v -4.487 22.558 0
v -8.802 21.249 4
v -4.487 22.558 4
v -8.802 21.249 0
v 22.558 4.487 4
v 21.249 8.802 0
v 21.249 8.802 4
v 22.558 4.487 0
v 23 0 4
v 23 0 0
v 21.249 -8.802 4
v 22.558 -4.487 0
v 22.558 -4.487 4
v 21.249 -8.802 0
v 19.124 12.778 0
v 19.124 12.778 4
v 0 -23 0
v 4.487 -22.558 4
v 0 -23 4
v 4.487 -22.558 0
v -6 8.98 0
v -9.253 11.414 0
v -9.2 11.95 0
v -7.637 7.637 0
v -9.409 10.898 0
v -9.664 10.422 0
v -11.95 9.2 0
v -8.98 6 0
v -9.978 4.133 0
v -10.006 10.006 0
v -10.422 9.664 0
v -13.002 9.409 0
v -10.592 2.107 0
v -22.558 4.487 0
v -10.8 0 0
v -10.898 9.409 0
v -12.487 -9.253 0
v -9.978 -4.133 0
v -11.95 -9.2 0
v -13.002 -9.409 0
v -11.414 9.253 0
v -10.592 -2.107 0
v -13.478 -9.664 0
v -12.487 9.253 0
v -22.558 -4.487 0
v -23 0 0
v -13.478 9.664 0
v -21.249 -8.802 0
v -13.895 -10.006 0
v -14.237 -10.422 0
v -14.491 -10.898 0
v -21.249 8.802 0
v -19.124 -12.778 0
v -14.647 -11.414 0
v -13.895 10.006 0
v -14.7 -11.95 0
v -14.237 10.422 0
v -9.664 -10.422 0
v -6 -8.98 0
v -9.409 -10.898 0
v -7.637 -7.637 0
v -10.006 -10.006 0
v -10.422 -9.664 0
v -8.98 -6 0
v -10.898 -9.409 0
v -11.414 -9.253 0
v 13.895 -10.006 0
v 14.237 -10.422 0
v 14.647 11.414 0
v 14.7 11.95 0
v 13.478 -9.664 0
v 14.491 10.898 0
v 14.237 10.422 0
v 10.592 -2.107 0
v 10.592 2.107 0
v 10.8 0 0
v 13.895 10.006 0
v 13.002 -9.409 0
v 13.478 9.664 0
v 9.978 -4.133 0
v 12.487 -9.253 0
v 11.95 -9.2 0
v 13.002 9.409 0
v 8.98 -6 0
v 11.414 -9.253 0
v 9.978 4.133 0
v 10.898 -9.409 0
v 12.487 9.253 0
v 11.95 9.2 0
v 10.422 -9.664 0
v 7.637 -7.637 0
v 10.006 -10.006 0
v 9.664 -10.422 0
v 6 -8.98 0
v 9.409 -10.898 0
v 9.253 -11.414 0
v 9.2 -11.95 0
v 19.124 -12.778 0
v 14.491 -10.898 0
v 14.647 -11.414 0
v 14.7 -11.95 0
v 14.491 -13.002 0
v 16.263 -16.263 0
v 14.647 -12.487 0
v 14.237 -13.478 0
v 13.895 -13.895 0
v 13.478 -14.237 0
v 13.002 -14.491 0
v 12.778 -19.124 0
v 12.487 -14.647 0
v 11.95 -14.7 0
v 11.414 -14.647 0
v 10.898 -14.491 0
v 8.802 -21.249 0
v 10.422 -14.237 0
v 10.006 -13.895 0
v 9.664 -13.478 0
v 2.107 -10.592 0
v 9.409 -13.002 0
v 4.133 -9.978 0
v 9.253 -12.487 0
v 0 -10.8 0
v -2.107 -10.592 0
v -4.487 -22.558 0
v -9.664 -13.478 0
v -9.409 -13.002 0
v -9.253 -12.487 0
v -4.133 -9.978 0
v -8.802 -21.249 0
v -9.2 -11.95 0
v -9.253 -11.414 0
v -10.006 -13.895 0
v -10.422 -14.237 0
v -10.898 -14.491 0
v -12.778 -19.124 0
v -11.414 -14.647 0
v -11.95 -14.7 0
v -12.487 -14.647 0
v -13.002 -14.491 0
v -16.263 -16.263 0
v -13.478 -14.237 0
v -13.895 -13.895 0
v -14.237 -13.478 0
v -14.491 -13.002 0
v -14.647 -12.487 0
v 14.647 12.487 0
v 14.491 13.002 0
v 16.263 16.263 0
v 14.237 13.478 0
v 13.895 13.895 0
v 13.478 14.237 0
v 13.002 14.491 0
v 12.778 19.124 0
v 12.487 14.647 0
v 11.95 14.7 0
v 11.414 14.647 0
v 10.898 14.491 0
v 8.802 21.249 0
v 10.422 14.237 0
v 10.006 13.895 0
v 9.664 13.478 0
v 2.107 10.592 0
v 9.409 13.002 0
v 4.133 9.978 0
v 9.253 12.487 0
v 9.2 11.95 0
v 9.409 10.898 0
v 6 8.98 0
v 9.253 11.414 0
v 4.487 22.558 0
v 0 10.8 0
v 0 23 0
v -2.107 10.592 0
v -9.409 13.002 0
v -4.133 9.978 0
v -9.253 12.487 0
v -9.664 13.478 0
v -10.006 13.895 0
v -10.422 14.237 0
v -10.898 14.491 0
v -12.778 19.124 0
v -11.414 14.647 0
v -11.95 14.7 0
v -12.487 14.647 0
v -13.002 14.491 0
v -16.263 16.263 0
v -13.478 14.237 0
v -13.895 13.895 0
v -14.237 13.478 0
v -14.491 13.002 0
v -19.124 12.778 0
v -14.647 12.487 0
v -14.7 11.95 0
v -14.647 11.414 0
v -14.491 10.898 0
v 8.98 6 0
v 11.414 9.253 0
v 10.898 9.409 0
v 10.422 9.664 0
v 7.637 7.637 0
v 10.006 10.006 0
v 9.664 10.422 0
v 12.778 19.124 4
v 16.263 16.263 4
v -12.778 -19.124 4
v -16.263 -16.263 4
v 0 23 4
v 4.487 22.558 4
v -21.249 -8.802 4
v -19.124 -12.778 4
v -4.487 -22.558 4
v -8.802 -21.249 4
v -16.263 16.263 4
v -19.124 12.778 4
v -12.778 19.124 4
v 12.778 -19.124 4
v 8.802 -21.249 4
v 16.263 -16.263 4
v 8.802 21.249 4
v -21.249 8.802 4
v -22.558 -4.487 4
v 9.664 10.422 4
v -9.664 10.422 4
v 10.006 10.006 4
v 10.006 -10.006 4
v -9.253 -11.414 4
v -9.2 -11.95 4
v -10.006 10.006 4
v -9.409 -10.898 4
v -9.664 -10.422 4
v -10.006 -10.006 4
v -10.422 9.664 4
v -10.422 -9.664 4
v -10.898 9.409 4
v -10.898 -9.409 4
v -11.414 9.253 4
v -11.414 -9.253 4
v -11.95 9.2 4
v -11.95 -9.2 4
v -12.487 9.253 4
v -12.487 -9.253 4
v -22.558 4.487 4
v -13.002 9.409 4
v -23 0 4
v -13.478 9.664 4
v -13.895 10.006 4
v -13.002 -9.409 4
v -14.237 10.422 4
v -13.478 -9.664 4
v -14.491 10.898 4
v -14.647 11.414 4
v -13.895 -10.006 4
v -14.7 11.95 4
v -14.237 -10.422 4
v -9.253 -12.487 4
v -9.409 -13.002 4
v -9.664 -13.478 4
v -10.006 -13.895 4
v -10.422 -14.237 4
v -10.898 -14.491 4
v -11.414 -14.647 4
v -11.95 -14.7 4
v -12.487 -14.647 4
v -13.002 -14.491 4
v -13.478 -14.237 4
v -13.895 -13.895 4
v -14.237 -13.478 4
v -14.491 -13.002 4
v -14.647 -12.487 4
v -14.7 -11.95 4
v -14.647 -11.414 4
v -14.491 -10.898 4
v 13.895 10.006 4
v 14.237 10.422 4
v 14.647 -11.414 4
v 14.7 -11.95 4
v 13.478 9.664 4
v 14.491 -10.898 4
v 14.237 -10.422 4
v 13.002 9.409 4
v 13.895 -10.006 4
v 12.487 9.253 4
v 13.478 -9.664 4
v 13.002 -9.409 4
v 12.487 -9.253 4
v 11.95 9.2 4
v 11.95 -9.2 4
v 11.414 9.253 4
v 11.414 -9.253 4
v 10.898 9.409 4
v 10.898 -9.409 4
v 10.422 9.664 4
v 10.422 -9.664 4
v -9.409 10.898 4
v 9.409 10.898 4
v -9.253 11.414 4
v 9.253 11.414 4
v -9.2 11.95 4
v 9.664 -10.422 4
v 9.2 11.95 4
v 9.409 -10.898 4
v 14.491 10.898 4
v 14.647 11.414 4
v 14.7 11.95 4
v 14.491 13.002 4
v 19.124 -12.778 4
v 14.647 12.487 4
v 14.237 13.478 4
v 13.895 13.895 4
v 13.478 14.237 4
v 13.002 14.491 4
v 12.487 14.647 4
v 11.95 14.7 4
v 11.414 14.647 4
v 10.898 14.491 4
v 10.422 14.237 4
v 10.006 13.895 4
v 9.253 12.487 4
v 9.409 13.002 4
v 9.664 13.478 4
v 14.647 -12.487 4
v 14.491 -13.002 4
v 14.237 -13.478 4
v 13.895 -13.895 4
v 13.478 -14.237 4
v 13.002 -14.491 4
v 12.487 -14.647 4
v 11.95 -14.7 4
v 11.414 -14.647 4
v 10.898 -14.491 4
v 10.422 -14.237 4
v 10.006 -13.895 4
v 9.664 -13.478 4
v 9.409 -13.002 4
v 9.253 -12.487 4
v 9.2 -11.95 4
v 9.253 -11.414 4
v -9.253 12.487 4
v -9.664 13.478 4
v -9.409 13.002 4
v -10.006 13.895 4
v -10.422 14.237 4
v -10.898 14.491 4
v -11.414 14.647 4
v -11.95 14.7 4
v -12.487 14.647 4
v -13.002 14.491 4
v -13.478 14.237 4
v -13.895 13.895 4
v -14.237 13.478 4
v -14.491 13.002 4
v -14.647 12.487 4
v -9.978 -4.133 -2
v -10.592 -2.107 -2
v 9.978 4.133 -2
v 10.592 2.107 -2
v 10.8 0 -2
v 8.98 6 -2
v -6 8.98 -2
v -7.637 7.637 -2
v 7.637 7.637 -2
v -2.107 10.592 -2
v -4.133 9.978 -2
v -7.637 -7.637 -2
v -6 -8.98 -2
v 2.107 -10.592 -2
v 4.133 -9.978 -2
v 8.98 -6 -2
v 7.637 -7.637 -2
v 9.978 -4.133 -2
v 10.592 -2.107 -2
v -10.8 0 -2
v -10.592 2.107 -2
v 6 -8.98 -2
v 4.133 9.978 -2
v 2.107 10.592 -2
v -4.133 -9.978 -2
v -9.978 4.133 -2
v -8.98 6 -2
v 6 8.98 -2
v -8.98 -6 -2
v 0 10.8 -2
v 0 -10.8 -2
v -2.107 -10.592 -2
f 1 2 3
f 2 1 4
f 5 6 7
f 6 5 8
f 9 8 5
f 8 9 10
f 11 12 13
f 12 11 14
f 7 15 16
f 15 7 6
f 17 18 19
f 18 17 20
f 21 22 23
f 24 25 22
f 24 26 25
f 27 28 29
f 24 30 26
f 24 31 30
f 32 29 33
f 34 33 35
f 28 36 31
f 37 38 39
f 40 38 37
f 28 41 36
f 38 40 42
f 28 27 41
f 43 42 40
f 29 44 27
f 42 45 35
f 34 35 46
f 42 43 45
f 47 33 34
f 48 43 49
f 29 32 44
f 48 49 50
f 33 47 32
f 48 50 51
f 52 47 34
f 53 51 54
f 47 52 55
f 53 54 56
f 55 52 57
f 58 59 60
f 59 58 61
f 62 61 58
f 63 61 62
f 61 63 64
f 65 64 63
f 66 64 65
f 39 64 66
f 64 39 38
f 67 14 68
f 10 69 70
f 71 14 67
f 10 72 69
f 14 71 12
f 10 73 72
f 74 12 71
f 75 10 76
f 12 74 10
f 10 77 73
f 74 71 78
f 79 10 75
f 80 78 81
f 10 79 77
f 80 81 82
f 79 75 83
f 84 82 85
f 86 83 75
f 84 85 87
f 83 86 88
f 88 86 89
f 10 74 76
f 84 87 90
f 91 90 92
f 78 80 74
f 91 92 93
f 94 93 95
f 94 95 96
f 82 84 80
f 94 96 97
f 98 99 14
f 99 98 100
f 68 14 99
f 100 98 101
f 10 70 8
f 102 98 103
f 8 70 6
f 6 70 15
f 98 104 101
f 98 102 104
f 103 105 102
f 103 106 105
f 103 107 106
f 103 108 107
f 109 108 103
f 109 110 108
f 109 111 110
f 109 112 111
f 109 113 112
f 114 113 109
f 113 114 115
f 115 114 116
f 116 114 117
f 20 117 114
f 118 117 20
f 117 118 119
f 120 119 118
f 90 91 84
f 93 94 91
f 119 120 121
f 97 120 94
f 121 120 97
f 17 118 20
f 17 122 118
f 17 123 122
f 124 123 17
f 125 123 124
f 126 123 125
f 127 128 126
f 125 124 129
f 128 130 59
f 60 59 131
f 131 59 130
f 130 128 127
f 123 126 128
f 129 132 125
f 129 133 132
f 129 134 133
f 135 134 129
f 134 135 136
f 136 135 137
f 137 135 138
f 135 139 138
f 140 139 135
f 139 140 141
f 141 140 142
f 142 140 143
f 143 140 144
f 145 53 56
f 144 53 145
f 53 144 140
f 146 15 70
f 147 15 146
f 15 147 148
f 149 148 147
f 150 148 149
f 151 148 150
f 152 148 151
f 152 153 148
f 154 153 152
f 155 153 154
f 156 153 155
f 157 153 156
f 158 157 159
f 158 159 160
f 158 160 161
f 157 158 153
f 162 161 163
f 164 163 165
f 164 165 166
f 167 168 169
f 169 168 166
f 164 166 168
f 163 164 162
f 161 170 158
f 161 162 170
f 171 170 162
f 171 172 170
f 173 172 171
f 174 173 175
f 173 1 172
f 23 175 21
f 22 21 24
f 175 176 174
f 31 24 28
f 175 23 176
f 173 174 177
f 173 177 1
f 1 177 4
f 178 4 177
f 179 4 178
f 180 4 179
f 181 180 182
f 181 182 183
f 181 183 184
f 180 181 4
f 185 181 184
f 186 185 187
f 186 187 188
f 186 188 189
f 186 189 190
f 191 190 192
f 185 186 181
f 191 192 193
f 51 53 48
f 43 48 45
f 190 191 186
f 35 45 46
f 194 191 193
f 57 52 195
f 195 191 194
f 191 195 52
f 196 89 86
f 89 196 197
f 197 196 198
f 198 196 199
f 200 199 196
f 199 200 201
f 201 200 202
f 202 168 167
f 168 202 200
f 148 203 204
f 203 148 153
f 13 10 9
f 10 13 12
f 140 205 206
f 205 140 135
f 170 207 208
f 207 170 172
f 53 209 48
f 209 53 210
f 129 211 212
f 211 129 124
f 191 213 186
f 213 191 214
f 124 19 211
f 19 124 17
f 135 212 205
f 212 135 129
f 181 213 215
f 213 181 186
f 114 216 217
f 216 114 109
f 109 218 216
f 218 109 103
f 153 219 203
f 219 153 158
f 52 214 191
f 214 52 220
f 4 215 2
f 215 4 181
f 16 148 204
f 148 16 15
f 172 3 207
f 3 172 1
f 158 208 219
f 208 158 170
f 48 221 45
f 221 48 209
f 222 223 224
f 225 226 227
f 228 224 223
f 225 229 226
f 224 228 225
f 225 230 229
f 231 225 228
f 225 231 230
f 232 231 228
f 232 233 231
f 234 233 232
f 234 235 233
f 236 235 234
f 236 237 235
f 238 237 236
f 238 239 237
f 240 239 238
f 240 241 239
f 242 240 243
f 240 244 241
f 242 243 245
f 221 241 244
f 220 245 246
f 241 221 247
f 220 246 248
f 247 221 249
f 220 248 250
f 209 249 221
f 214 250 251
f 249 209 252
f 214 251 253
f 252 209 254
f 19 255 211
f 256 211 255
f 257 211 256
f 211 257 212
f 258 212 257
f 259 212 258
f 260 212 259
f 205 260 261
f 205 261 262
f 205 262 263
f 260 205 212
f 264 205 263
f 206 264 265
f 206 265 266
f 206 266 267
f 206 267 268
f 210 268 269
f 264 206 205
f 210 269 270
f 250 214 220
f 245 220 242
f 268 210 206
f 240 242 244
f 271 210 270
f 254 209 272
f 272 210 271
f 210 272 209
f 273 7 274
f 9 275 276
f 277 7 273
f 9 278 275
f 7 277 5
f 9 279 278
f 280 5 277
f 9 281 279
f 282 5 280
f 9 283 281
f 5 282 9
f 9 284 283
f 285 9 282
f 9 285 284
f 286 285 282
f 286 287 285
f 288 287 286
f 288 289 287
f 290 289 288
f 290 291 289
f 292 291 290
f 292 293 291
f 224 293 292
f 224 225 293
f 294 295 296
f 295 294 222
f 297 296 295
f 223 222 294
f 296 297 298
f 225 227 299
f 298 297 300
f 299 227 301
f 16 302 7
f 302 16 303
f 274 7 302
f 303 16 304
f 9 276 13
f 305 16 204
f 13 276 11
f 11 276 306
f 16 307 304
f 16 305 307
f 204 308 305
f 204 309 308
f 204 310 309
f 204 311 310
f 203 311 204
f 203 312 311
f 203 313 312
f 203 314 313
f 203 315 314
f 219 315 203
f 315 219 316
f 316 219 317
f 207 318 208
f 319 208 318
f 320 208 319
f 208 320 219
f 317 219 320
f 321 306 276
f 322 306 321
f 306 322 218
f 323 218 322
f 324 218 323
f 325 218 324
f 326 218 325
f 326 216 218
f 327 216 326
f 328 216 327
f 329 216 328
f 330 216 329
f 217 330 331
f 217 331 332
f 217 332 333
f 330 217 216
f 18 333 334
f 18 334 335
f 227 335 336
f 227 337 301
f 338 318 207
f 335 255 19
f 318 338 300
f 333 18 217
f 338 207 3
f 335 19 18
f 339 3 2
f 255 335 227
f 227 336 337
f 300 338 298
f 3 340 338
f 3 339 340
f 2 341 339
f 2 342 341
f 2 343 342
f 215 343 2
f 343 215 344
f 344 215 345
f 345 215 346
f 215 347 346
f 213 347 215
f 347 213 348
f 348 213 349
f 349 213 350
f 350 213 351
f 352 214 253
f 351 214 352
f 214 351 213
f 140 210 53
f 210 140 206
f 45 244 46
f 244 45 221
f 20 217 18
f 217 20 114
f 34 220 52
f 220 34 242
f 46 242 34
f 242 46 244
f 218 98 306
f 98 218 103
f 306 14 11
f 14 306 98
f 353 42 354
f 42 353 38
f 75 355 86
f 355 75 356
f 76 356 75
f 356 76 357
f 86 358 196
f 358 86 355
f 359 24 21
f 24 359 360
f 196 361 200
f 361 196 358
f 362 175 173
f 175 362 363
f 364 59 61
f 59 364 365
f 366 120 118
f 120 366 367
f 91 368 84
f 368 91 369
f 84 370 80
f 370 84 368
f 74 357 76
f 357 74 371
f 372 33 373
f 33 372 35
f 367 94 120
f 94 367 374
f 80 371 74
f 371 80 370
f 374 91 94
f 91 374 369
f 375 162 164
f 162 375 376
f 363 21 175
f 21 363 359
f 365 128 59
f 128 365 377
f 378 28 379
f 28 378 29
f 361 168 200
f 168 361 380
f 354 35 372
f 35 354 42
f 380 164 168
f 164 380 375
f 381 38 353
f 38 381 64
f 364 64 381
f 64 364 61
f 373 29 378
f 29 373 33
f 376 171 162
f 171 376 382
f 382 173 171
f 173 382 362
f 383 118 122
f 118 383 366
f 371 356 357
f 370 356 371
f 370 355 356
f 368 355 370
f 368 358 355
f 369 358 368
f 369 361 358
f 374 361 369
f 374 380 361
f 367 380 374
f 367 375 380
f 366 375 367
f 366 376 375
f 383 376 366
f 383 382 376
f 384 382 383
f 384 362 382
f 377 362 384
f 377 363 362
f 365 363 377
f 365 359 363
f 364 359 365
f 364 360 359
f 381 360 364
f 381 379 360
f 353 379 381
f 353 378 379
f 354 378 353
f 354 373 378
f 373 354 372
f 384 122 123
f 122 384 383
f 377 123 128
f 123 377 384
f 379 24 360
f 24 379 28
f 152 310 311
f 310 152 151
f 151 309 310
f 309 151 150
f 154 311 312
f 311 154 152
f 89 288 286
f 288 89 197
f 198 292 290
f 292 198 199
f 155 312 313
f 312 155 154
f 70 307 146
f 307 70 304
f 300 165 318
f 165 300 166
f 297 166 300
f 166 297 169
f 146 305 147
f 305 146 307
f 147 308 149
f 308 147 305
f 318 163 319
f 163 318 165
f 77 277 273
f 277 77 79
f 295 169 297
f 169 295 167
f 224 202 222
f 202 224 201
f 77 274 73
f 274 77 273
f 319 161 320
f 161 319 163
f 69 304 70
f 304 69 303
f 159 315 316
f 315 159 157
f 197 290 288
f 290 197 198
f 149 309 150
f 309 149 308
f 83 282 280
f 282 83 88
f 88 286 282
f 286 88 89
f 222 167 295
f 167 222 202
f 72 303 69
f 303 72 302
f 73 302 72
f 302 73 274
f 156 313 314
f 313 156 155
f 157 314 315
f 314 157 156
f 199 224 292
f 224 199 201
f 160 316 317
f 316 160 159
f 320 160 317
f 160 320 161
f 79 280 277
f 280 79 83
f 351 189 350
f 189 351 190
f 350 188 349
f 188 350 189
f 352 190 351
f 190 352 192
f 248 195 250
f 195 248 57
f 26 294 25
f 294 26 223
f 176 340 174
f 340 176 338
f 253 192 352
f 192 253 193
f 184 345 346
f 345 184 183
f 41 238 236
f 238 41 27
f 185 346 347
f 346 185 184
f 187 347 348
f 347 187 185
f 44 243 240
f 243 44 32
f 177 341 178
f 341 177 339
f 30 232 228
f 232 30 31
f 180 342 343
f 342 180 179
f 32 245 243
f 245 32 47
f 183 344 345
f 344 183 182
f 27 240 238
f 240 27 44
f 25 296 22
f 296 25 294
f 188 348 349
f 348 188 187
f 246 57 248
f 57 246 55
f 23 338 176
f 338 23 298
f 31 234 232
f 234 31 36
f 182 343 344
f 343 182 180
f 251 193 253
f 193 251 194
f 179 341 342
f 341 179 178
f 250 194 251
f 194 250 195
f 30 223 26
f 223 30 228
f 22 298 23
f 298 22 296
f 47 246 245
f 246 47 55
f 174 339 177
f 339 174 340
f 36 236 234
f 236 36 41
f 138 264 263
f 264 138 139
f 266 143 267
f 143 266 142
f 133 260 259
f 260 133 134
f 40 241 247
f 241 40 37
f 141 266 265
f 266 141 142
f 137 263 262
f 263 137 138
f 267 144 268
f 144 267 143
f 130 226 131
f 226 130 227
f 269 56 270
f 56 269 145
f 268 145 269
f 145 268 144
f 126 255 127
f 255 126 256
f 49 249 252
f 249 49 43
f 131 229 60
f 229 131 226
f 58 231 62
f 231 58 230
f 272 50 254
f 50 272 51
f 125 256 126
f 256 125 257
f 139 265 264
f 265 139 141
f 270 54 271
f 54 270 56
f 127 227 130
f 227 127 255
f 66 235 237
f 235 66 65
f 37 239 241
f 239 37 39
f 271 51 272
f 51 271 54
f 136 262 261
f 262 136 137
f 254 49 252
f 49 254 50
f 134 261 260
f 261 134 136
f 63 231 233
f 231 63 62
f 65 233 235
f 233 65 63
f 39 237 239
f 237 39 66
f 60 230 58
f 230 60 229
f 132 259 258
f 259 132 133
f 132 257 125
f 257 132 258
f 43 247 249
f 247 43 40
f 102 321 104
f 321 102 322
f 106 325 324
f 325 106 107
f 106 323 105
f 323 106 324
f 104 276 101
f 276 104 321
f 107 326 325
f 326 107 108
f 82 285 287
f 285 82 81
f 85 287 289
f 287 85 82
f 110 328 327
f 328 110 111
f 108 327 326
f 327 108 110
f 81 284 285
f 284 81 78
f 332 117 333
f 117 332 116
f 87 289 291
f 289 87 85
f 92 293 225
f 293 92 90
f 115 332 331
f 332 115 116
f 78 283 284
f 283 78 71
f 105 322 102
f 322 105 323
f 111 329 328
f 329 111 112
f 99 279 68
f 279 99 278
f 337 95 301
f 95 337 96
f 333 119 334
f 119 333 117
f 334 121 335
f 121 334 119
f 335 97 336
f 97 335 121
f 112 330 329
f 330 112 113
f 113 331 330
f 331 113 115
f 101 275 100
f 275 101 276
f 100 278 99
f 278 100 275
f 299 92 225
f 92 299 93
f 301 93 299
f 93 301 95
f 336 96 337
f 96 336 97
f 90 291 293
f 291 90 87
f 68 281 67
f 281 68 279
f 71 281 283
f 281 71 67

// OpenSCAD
$fn = 32;

// ----------------------------------------------------------------------
// Retaining cap: 608 cover, 46 mm, spigot 21.6 mm
// ----------------------------------------------------------------------

// --- parameters (mm) ---
plate_d = 46;             // cover diameter
plate_t = 4;              // cover thickness
boss_d = 21.6;            // spigot that enters the housing
boss_h = 2;               // spigot height
bolt_d = 5.5;             // bolt clearance
bolt_r = 16.9;            // bolt circle radius

module cover() {
  cylinder(h = plate_t, d = plate_d);
}

module spigot() {
  /* sunk 1 mm into the cover; the spigot sets the overall height */
  translate([0, 0, -boss_h]) cylinder(h = boss_h + 1, d = boss_d);
}

difference() {
  union() {
    cover();
    spigot();
  }
  for (i = [0 : 3]) rotate([0, 0, 45 + i * 90]) translate([bolt_r, 0, -boss_h - 1])
    cylinder(h = boss_h + plate_t + 2, d = bolt_d);
}
